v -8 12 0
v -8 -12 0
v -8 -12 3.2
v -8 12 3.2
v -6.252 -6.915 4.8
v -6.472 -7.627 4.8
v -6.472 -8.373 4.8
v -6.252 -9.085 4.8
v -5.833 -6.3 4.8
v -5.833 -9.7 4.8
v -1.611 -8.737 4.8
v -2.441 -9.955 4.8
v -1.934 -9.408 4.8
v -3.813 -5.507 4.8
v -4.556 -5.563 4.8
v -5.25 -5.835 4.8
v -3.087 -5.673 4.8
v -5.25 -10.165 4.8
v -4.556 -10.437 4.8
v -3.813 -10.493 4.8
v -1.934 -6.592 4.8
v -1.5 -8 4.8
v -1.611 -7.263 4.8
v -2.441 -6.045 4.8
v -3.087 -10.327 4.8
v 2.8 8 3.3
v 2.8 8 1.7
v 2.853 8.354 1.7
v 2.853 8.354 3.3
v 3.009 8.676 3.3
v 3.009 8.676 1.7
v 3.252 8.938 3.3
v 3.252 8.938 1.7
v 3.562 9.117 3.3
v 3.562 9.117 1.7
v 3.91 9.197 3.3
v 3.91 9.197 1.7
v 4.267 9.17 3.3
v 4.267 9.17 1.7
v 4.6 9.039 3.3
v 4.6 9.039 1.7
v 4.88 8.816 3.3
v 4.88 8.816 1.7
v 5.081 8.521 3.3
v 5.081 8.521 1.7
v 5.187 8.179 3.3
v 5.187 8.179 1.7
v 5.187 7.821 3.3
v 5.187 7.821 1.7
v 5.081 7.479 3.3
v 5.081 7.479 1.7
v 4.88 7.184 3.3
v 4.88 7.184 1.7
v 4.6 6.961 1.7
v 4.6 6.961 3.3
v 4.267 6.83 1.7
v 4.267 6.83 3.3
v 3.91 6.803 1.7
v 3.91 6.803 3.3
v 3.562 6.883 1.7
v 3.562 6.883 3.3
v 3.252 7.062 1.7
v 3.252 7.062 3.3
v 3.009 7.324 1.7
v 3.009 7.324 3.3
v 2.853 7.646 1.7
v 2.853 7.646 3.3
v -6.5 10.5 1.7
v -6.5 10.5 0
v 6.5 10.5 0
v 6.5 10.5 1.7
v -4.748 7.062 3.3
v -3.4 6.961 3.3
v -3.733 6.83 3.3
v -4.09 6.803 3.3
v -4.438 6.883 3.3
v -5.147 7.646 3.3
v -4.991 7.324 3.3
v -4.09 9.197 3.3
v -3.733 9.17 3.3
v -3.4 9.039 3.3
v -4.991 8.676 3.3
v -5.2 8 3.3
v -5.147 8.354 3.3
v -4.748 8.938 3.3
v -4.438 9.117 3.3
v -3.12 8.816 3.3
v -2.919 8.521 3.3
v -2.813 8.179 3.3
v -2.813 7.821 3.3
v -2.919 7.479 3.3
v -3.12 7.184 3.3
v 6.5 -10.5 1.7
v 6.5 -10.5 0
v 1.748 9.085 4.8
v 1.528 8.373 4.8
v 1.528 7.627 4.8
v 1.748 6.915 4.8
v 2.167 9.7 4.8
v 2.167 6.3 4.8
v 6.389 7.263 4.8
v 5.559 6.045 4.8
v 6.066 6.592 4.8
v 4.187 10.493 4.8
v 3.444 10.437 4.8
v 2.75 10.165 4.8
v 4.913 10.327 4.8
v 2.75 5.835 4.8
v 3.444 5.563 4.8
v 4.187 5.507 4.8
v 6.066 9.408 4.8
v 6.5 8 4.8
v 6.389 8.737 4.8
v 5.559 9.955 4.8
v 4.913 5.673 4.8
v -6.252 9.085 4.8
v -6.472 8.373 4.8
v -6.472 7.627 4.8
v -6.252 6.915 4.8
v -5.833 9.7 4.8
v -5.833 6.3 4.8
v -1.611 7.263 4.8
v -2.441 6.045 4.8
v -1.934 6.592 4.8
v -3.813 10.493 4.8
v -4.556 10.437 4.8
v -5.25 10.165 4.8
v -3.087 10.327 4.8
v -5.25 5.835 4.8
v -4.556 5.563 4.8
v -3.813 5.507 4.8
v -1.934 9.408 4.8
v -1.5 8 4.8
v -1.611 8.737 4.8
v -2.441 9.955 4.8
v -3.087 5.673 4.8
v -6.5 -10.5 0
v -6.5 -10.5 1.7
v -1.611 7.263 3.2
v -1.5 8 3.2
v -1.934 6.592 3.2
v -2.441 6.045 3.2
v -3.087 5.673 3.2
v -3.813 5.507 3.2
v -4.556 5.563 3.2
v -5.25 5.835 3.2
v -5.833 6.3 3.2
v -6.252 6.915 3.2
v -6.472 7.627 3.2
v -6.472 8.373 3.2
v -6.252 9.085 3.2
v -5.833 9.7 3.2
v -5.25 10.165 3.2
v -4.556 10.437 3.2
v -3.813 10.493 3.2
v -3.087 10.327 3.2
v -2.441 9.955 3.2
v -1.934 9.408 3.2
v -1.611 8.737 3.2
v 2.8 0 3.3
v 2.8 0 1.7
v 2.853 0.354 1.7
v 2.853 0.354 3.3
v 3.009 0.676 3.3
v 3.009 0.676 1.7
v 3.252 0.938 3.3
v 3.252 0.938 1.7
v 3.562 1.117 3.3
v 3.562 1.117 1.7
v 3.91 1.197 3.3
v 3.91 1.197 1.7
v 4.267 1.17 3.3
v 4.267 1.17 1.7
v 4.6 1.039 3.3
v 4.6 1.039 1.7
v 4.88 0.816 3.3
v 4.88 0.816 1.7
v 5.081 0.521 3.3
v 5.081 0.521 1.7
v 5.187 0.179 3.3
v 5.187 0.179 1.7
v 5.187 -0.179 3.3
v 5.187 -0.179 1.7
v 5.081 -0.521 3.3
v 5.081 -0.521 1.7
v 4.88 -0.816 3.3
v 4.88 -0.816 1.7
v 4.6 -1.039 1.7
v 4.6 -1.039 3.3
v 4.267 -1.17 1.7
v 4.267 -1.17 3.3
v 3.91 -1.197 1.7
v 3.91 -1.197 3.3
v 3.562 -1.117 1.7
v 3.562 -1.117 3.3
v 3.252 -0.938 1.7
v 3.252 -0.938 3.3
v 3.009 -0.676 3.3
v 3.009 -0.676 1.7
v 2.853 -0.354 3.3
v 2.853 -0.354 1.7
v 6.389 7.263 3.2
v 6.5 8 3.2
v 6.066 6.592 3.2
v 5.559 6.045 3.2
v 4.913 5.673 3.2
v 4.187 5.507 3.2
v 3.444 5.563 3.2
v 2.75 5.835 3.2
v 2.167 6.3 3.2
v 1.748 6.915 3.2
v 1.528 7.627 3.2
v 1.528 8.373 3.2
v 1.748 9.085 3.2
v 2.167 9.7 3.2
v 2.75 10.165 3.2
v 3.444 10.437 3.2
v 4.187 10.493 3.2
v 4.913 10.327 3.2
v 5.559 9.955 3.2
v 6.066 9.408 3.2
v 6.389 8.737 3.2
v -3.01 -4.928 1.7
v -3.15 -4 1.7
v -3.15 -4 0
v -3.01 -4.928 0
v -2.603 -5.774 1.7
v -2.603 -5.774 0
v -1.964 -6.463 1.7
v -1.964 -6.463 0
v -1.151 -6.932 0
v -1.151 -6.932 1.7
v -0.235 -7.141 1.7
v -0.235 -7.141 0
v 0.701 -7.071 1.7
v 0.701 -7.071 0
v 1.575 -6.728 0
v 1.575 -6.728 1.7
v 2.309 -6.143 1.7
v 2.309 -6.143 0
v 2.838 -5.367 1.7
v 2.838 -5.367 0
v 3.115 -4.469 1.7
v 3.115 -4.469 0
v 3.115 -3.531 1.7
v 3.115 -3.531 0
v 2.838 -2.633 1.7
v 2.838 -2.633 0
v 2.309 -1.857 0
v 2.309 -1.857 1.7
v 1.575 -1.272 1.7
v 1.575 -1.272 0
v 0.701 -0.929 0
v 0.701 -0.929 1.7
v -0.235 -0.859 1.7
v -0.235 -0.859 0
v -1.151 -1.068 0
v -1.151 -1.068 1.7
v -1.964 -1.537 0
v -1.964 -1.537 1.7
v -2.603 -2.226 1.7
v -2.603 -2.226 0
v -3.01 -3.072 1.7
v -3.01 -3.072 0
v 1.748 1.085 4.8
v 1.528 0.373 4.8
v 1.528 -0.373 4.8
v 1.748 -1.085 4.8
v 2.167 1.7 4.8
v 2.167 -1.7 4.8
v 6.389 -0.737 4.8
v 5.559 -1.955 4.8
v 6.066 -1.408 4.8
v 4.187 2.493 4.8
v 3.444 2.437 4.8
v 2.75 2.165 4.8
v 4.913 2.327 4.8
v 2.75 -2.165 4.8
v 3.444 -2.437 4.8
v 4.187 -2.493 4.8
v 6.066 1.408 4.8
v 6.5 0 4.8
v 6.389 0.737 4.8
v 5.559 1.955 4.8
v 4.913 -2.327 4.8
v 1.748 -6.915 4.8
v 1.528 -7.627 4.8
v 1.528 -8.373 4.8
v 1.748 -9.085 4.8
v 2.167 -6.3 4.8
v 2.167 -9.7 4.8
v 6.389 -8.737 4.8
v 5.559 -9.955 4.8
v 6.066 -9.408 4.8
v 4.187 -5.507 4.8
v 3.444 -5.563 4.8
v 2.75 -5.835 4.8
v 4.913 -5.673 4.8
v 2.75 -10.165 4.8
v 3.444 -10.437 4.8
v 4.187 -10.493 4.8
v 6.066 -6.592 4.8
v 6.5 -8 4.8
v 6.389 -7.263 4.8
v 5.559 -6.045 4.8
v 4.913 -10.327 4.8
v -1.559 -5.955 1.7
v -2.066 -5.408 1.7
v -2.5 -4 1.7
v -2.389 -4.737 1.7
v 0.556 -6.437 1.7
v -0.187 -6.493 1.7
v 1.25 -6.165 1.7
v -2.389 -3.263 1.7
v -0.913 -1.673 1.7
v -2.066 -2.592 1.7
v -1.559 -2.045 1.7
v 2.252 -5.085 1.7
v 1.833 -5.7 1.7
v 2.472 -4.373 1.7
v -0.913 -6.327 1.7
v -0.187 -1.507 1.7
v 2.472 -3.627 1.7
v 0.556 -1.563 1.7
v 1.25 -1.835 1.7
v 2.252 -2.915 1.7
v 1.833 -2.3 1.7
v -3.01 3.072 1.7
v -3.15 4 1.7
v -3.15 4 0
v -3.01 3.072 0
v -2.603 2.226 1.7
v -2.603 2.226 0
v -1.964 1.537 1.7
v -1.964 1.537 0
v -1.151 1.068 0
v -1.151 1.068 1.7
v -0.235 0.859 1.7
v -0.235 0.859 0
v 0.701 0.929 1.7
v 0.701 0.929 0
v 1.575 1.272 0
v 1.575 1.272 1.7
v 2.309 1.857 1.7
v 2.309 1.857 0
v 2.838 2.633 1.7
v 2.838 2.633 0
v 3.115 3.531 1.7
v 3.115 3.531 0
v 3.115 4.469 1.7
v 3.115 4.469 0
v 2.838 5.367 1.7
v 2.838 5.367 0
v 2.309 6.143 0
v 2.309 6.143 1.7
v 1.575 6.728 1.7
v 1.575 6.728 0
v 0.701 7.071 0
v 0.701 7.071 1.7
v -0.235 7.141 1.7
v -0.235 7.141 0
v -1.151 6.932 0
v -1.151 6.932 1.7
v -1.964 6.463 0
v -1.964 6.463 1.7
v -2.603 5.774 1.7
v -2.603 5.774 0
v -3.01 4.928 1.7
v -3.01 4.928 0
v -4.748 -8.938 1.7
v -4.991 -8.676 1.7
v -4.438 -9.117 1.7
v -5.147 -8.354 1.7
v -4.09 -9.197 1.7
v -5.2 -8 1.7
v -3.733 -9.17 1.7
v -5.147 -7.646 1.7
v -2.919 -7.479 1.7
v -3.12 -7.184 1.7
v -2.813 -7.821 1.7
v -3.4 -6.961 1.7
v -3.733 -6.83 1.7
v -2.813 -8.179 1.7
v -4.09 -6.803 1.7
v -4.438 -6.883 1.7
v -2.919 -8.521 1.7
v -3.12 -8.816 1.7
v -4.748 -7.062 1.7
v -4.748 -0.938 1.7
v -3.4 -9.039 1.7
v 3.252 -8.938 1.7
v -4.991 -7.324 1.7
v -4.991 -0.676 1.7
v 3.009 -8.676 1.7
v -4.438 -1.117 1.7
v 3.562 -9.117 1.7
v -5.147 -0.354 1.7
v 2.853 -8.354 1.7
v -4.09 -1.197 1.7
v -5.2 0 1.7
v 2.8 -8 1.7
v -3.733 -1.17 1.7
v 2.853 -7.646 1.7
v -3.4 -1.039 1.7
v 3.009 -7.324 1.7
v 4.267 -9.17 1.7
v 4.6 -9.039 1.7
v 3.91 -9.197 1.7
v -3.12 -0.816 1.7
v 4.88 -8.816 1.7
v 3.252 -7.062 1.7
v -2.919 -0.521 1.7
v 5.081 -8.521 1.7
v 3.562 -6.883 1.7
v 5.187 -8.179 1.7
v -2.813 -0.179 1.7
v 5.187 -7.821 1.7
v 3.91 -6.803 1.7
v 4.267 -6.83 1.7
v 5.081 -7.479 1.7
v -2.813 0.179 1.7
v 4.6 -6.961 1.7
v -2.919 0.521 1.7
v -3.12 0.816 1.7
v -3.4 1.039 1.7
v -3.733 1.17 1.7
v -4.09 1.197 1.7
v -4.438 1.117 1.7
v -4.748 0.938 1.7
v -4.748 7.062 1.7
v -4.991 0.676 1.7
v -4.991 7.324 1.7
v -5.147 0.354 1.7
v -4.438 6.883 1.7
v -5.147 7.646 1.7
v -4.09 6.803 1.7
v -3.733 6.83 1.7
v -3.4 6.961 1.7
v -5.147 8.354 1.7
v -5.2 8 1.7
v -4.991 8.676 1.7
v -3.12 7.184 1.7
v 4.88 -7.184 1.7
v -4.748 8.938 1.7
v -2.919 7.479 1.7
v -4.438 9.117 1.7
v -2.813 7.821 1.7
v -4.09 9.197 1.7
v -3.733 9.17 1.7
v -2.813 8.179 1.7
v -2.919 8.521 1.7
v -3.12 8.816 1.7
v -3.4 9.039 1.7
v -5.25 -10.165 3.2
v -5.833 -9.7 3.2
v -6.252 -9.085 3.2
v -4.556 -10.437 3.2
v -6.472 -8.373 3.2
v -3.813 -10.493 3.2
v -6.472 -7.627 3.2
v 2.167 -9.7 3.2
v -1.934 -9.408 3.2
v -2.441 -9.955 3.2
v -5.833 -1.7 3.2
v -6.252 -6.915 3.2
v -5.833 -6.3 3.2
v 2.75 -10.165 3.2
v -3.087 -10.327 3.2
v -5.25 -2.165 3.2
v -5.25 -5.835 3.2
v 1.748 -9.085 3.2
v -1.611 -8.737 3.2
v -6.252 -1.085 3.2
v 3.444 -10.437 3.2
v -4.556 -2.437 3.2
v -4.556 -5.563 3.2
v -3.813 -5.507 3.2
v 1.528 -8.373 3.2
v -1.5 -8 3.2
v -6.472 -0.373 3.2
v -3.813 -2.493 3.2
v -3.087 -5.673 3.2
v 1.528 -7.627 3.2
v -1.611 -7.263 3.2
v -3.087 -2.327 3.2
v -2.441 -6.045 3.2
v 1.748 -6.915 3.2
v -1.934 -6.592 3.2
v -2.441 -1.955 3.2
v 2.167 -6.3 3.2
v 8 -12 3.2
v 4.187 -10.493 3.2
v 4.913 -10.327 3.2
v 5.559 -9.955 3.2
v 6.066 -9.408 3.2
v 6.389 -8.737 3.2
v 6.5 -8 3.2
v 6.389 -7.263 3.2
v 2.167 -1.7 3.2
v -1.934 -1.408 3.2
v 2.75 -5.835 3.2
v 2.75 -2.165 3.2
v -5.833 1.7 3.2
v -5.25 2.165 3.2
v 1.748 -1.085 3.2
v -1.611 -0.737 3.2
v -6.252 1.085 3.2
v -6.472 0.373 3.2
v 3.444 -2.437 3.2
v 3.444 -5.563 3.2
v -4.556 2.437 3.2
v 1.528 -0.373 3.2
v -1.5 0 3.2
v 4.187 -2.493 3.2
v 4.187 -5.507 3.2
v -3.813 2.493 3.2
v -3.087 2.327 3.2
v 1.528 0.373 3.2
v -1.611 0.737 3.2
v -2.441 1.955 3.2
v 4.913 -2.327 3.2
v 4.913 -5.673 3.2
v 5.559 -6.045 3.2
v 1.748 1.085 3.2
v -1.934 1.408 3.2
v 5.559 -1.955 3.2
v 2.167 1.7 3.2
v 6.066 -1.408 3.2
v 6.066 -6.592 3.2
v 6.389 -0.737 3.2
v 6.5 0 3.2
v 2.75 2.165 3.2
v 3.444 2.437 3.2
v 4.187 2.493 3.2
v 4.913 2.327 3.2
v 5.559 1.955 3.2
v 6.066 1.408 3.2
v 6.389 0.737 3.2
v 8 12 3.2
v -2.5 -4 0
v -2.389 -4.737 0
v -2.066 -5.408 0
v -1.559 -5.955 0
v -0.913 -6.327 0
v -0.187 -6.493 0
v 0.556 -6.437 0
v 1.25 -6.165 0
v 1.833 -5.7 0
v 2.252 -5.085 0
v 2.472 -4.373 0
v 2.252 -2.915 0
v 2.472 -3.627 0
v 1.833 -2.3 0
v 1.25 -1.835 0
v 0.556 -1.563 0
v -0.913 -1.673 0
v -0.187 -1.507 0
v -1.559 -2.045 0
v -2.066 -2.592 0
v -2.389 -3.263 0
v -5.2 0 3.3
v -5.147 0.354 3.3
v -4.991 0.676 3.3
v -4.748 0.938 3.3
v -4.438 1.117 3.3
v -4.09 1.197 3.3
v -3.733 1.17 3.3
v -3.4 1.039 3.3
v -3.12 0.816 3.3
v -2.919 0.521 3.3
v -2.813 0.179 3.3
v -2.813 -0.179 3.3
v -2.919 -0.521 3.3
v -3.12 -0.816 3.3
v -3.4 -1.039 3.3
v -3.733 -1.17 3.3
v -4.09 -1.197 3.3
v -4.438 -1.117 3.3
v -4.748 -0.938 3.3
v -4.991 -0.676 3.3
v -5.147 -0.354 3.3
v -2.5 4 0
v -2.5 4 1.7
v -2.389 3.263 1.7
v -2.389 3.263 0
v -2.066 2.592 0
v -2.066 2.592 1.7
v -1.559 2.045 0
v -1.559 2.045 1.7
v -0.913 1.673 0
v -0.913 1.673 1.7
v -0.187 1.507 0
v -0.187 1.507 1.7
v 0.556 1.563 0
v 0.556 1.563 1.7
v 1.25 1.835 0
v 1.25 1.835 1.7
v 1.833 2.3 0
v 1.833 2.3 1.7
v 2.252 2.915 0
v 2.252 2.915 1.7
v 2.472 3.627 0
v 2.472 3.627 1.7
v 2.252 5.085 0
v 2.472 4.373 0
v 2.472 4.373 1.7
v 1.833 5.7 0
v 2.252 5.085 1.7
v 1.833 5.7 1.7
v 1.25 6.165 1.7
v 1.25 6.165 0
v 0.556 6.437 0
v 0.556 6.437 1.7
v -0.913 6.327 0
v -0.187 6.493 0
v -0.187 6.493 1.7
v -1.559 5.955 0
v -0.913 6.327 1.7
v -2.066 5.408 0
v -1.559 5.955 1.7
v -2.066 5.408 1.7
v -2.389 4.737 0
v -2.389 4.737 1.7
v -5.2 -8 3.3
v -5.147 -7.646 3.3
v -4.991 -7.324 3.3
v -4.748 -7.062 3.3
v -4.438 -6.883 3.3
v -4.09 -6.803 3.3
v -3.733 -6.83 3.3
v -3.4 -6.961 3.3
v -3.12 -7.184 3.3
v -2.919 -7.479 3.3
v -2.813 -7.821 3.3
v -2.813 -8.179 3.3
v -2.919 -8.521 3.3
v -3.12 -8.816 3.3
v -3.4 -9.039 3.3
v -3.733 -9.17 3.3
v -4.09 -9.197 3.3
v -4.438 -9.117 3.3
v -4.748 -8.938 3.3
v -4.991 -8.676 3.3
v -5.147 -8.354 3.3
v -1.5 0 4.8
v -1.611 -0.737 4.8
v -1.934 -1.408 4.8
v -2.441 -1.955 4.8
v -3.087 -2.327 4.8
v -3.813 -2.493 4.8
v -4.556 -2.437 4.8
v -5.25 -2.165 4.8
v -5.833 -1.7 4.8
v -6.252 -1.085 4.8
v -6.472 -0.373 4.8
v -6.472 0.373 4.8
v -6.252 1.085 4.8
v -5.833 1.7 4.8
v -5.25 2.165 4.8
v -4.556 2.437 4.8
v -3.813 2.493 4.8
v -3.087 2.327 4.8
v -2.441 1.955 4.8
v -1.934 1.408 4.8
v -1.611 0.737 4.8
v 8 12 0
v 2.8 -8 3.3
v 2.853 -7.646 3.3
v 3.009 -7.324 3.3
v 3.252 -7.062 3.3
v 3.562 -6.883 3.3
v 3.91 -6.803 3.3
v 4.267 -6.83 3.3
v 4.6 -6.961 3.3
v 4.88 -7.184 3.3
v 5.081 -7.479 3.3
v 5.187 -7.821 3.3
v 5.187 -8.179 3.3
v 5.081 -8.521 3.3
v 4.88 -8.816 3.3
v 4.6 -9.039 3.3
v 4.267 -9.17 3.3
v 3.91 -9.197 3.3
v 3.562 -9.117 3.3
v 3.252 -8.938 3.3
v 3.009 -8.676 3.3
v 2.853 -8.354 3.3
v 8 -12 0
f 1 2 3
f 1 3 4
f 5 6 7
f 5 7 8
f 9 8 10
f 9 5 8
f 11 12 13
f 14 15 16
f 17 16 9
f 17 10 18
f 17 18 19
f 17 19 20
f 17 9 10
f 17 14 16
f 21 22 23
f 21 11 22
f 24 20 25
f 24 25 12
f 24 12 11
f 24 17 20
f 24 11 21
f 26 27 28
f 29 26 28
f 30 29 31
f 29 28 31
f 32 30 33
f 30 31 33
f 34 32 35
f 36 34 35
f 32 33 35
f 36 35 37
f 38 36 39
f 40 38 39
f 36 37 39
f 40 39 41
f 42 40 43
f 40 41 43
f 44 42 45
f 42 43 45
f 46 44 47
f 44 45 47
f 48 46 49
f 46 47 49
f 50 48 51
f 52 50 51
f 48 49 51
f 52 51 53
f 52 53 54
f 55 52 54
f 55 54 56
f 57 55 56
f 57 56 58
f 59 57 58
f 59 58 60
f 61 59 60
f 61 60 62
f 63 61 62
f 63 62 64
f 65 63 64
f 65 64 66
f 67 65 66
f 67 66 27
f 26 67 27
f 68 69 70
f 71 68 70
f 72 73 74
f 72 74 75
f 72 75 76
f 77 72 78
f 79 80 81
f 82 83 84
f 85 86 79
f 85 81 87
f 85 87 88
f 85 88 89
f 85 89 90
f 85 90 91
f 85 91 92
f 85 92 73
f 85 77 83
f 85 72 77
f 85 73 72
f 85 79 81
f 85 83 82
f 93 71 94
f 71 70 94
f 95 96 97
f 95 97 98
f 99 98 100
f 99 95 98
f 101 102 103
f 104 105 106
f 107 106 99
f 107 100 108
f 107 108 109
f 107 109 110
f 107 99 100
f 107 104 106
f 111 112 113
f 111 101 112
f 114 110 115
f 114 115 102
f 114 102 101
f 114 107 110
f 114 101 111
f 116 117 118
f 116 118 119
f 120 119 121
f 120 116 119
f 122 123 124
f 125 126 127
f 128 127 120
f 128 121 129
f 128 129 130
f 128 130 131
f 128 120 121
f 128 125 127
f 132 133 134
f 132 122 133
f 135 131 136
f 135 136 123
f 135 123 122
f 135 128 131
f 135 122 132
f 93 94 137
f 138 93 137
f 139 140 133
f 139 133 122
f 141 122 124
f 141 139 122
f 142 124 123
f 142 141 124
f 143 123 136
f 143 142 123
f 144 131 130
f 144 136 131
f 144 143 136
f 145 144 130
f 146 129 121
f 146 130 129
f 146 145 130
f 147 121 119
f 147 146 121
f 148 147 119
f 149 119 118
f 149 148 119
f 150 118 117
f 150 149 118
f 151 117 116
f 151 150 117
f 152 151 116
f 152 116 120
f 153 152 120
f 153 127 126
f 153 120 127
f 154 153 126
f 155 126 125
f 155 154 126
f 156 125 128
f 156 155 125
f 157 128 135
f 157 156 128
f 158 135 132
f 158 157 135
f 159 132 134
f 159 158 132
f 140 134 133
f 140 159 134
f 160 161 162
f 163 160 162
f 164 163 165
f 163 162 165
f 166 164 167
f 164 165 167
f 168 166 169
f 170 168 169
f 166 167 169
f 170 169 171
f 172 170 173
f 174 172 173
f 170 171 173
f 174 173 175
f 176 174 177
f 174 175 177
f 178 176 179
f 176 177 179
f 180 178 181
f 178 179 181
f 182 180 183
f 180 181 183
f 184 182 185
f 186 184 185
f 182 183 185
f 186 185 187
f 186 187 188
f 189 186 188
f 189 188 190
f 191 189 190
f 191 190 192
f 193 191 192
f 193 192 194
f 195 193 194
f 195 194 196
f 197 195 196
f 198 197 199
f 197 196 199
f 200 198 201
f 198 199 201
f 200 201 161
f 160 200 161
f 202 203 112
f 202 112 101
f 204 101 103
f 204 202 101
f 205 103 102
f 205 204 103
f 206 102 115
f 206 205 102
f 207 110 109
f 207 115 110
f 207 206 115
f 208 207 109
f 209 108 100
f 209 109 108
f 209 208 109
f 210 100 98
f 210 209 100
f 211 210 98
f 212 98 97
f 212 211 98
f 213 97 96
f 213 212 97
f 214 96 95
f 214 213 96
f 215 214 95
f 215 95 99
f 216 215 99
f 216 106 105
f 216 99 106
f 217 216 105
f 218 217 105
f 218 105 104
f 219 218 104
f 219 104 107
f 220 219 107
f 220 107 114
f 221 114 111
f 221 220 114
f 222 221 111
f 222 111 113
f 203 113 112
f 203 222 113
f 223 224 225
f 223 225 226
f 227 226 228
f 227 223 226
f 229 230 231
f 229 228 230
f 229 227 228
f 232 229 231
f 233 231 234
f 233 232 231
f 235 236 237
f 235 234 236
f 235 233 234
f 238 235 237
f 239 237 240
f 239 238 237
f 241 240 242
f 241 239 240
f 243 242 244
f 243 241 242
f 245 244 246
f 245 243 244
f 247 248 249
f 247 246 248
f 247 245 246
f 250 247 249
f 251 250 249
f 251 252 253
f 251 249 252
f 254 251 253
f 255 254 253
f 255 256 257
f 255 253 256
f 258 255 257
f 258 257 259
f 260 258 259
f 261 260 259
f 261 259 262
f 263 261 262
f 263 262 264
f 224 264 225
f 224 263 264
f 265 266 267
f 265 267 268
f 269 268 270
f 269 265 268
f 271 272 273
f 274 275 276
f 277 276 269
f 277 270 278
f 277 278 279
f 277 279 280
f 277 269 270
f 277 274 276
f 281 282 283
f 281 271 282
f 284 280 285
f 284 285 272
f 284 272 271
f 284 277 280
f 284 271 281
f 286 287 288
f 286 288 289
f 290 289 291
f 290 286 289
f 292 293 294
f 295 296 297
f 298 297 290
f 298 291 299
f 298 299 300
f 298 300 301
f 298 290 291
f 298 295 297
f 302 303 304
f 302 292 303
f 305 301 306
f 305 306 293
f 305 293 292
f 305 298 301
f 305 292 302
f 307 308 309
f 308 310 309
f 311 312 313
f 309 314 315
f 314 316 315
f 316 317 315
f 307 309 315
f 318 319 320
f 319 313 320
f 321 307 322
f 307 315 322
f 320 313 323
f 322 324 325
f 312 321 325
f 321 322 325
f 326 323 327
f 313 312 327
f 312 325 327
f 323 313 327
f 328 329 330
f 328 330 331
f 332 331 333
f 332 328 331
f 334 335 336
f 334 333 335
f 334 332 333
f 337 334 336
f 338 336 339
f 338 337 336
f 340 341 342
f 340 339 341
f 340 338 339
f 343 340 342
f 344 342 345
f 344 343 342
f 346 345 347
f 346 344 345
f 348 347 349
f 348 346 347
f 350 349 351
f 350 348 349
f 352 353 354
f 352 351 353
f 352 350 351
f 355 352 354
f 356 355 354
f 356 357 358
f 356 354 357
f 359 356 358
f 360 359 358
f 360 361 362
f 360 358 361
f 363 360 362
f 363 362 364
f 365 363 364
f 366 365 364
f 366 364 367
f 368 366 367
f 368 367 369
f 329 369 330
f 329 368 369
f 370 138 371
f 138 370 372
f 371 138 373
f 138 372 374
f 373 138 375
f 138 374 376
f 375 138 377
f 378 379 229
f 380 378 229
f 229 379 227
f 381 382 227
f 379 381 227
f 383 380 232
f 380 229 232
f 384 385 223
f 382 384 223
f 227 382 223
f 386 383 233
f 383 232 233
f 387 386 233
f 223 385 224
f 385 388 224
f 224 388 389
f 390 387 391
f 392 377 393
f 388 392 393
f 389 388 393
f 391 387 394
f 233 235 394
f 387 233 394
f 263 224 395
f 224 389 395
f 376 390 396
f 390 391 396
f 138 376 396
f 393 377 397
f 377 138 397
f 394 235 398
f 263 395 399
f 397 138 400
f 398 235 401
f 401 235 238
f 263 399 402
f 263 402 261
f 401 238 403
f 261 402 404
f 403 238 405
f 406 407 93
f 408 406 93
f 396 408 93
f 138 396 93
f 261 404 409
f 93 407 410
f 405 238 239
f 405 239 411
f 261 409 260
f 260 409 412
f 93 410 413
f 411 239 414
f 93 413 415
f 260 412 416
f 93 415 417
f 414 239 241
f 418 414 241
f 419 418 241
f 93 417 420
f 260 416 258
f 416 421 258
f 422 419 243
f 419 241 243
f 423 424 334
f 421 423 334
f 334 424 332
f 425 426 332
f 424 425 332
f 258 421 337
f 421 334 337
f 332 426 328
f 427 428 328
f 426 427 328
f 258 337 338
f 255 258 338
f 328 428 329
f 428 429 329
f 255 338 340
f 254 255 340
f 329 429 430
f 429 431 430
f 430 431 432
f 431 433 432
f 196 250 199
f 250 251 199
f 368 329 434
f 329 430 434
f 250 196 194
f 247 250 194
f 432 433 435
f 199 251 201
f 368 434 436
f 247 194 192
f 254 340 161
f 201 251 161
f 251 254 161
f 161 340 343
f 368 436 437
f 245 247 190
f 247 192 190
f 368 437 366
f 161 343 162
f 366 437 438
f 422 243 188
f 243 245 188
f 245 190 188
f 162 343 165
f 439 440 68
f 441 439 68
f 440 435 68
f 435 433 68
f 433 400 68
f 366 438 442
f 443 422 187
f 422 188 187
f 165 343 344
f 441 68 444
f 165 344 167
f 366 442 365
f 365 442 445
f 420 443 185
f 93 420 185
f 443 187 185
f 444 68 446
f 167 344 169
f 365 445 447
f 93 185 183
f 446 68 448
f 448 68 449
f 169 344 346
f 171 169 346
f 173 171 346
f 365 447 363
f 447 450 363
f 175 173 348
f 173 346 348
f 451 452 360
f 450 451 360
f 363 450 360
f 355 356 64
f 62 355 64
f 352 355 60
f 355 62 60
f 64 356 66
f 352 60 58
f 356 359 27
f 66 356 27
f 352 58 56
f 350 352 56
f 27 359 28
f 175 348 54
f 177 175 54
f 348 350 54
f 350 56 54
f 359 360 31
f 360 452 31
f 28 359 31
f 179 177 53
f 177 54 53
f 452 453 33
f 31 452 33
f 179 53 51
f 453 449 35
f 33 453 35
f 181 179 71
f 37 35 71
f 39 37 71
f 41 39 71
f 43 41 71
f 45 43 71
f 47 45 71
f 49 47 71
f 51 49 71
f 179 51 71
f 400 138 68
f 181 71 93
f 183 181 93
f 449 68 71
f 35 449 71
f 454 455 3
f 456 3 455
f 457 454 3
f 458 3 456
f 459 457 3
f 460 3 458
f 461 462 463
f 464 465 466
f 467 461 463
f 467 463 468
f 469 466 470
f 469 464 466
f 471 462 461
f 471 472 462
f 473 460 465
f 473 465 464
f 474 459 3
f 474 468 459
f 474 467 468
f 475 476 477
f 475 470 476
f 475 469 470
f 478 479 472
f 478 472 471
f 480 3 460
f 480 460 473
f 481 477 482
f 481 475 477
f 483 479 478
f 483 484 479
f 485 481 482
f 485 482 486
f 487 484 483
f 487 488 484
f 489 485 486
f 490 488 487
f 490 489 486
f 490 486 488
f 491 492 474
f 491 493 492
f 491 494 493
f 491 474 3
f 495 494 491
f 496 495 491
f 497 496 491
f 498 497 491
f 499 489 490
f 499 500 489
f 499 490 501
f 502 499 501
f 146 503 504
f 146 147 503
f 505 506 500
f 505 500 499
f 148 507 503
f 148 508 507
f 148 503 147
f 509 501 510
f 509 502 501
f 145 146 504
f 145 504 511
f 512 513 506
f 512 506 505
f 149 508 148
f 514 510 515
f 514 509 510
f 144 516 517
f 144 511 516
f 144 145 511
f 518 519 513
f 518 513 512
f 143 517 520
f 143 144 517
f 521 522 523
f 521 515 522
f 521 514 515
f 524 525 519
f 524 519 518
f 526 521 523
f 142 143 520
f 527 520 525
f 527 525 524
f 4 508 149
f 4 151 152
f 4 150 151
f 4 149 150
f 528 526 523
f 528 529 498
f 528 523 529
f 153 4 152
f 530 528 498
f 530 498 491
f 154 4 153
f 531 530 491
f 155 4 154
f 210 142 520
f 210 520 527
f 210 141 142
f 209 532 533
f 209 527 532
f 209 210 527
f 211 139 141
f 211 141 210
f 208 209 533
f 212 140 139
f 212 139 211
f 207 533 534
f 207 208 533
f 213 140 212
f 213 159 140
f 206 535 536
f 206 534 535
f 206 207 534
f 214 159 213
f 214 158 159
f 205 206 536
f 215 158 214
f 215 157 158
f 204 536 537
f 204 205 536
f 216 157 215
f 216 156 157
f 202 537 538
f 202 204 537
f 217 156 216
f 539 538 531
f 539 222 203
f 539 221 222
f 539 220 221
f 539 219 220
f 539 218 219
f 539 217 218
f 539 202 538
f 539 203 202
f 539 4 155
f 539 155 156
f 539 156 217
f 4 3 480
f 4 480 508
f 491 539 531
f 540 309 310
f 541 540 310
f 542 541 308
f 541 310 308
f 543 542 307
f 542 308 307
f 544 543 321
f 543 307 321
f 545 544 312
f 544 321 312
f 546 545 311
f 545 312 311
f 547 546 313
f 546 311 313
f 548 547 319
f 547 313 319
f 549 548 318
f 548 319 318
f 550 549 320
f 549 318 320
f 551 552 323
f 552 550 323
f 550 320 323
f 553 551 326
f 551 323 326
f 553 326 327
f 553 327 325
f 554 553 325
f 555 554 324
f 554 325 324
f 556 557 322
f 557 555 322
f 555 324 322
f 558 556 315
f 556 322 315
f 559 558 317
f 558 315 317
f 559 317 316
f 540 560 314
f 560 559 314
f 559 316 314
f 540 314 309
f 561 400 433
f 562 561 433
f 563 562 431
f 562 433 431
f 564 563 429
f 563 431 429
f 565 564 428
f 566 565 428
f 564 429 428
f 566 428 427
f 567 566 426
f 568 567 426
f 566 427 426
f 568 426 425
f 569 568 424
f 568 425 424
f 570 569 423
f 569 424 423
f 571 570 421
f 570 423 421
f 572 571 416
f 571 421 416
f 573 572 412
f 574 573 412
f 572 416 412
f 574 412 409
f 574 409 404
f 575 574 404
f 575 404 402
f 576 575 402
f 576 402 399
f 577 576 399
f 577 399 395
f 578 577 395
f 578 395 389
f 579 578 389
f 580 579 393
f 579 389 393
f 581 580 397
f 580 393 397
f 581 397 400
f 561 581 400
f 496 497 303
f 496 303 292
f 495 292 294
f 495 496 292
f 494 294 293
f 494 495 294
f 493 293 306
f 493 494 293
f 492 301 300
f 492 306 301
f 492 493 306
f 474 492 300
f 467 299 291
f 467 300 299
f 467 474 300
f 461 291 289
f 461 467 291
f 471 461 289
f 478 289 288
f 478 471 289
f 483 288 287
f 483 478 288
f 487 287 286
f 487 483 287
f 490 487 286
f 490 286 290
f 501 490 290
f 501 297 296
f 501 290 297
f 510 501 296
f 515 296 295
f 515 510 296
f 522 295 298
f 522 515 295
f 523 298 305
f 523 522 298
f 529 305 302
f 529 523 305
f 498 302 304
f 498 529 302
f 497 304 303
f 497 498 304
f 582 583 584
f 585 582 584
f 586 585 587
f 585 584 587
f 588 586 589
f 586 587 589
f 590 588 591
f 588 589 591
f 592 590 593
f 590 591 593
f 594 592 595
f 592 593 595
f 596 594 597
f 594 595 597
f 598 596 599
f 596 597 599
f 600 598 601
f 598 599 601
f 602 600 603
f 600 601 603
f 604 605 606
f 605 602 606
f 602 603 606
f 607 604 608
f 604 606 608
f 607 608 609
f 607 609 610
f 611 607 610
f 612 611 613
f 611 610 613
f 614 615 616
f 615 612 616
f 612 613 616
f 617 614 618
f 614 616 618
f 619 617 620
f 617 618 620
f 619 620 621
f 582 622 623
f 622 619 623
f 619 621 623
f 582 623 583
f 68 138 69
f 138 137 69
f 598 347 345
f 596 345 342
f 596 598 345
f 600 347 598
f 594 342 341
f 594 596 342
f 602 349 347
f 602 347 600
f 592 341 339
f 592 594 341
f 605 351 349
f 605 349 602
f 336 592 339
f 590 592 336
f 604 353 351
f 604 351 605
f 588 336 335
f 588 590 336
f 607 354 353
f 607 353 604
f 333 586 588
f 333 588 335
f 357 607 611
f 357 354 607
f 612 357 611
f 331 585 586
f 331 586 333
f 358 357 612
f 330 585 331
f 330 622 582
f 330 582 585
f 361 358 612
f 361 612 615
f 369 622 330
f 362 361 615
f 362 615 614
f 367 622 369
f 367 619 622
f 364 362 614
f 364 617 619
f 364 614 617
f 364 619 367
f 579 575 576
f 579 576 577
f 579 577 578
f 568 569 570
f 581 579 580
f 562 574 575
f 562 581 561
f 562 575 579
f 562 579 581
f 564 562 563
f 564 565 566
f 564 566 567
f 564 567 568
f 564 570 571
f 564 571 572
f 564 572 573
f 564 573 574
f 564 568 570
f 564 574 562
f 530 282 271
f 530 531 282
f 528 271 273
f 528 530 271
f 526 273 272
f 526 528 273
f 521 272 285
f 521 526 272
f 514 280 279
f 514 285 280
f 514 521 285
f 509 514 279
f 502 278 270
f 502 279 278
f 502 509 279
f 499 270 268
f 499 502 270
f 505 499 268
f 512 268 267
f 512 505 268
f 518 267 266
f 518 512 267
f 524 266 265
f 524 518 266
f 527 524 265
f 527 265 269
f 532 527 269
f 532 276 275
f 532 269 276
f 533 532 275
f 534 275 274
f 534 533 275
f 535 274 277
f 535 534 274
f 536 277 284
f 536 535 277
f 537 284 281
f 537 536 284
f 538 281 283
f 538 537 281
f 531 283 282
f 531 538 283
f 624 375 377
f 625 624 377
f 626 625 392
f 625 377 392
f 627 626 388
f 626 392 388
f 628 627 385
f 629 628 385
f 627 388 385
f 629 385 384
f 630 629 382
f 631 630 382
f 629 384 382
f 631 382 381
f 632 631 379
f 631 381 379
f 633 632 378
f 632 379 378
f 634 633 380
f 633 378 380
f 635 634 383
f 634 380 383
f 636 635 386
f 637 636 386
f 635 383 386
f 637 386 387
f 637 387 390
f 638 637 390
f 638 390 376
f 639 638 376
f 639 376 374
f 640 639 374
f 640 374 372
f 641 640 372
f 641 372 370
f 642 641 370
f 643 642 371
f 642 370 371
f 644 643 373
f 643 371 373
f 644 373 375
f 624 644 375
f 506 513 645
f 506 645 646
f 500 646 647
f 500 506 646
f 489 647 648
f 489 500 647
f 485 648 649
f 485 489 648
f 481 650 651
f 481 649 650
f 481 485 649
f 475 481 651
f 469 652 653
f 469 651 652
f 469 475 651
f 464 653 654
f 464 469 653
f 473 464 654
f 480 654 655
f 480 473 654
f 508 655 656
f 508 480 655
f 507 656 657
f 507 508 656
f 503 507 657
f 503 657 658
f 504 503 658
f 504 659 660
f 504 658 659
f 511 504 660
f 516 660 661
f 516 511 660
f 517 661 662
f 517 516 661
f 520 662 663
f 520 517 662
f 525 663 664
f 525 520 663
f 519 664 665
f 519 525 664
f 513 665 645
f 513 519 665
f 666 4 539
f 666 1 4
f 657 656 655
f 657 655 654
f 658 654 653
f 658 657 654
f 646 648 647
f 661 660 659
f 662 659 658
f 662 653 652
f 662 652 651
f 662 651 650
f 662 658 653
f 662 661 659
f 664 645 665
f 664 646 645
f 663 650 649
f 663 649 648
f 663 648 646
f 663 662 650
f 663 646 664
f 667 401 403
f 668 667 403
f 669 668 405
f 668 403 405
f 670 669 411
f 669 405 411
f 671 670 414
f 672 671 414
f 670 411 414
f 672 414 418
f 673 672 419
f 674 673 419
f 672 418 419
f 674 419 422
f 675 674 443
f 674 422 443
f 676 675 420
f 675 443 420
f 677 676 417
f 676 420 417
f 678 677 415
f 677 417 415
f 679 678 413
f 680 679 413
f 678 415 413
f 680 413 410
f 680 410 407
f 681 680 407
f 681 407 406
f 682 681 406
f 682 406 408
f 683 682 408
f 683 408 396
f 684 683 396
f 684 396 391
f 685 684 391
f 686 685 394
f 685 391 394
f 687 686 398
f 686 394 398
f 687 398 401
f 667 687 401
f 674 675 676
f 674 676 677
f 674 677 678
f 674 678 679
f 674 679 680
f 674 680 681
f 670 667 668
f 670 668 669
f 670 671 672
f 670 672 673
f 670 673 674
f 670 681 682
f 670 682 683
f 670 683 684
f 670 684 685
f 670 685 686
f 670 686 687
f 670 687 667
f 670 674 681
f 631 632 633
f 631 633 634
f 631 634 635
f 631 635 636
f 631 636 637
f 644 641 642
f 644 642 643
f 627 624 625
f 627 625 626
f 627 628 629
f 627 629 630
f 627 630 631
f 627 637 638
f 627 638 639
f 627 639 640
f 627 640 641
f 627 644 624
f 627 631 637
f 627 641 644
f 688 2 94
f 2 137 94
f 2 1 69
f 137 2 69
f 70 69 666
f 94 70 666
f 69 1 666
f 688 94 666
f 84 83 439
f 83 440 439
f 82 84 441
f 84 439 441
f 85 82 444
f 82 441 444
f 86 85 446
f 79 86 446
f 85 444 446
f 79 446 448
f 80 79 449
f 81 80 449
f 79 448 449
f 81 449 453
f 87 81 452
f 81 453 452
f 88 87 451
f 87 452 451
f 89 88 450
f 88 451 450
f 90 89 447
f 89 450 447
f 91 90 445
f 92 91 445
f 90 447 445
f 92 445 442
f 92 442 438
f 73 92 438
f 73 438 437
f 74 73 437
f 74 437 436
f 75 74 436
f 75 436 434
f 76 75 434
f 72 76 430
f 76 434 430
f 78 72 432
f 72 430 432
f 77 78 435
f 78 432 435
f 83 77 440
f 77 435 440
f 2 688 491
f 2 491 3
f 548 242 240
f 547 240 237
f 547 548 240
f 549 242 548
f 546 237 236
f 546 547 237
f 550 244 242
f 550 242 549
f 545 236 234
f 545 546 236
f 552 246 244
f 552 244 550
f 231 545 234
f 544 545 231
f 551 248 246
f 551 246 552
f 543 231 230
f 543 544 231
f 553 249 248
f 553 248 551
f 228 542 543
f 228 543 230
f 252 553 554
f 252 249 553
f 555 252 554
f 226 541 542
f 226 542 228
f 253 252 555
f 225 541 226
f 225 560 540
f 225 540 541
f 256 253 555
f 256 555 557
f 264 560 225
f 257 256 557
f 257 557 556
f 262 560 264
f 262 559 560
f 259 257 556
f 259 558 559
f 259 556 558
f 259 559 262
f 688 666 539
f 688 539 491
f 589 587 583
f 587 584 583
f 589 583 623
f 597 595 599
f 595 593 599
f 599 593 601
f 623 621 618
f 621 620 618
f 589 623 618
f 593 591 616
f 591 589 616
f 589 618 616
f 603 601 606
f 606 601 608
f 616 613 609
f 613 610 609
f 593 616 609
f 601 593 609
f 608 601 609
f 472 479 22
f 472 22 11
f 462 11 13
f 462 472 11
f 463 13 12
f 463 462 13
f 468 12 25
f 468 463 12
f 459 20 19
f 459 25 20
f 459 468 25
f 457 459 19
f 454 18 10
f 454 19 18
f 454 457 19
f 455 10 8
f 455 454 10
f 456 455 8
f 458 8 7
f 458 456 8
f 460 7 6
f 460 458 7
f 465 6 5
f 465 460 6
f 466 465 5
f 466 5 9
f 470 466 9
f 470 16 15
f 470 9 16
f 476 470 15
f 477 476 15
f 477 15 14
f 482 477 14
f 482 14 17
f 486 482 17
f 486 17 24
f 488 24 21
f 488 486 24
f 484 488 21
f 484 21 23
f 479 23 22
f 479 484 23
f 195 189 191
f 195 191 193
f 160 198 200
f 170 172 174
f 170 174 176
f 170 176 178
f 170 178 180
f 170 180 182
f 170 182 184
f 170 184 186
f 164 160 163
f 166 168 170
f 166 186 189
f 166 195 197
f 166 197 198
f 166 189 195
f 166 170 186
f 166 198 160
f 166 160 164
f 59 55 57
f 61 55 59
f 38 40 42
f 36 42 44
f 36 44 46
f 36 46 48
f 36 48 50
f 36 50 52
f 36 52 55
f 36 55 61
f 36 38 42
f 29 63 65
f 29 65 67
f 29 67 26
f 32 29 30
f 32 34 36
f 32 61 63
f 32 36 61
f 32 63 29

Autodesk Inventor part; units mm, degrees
ref_plane "YZ Plane" through (0, 0, 0) normal (1, 0, 0) x (0, 1, 0)
ref_plane "XZ Plane" through (0, 0, 0) normal (0, 1, 0) x (-1, 0, 0)
ref_plane "XY Plane" through (0, 0, 0) normal (0, 0, 1) x (1, 0, 0)
sketch "Sketch1" plane through (0, 0, 0) normal (0, 0, 1) x (1, 0, 0)
  line L0 (-8, 12) -> (8, 12)
  line L1 (8, 12) -> (8, -12)
  line L2 (8, -12) -> (-8, -12)
  line L3 (-8, -12) -> (-8, 12)
  point P0 (0, 0)
  dimension "d0" = 16
  dimension "d1" = 24
  dimension "d2" = 8
  dimension "d3" = 12
extrude "Extrusion1" add sketch "Sketch1" along normal blind 3.2
shell "Shell1" thickness 1.5 removed faces 1 at (2.6667, 4, 0)
sketch "Sketch2" plane through (0, 0, 3.2) normal (0, 0, 1) x (1, 0, 0)
  circle A0 centre (4, -8) radius 2.5
  line L0 (8, 12) -> (8, -12) projected
  line L1 (8, -12) -> (-8, -12) projected
  dimension "d7" = 5
  dimension "d10" = 4
  dimension "d11" = 4
extrude "Extrusion2" add sketch "Sketch2" along normal blind 1.6
sketch "Sketch3" plane through (6.5, -10.5, 1.7) normal (0, 0, -1) x (-1, 0, 0)
  circle A0 centre (2.5, 2.5) radius 2.5 projected
  circle A1 centre (2.5, 2.5) radius 1.2
  point P0 (6.5, 10.5)
  dimension "d18" = 2.4
extrude "Extrusion3" cut sketch "Sketch3" against normal blind 1.6 contours A1
pattern_linear "Rectangular Pattern1" count 3 spacing 8 along (0, 1, 0) count 2 spacing 8 along (-1, 0, 0) of "Extrusion2", "Extrusion3"
sketch "Sketch4" plane through (6.5, -10.5, 1.7) normal (0, 0, -1) x (-1, 0, 0)
  circle A0 centre (2.5, 10.5) radius 1.2 projected
  circle A1 centre (2.5, 2.5) radius 1.2 projected
  line L0 (0, 21) -> (0, 0) projected
  line L1 (0, 0) -> (13, 0) projected
  circle A2 centre (6.5, 6.5) radius 3.15
  circle A3 centre (6.5, 6.5) radius 2.5
  point P0 (6.5, 10.5)
  dimension "d21" = 6.5
  dimension "d22" = 6.5
  dimension "d23" = 10.5
  dimension "d24" = 2.5
  dimension "d25" = 5
  dimension "d26" = 6.3
extrude "Extrusion4" add sketch "Sketch4" along normal up to surface (1.7 mm away) contours A2
pattern_linear "Rectangular Pattern2" count 2 spacing 8 along (0, 1, 0) of "Extrusion4"
equation "\"d0\" = 8 * WIDTH"
equation "\"d1\" = 8 * LENGTH"
equation "\"d2\" = 0.5 * d0"
equation "\"d3\" = 0.5 * d1"
equation "\"d4\" = HEIGHT"
equation "\"d21\" = 0.5 * d23 + 0.5 * d24"
equation "\"d22\" = d21"
equation "\"WIDTH\" = 2"
equation "\"HEIGHT\" = 3.2"
equation "\"LENGTH\" = 3"
properties part number "3021" material "Steel"
